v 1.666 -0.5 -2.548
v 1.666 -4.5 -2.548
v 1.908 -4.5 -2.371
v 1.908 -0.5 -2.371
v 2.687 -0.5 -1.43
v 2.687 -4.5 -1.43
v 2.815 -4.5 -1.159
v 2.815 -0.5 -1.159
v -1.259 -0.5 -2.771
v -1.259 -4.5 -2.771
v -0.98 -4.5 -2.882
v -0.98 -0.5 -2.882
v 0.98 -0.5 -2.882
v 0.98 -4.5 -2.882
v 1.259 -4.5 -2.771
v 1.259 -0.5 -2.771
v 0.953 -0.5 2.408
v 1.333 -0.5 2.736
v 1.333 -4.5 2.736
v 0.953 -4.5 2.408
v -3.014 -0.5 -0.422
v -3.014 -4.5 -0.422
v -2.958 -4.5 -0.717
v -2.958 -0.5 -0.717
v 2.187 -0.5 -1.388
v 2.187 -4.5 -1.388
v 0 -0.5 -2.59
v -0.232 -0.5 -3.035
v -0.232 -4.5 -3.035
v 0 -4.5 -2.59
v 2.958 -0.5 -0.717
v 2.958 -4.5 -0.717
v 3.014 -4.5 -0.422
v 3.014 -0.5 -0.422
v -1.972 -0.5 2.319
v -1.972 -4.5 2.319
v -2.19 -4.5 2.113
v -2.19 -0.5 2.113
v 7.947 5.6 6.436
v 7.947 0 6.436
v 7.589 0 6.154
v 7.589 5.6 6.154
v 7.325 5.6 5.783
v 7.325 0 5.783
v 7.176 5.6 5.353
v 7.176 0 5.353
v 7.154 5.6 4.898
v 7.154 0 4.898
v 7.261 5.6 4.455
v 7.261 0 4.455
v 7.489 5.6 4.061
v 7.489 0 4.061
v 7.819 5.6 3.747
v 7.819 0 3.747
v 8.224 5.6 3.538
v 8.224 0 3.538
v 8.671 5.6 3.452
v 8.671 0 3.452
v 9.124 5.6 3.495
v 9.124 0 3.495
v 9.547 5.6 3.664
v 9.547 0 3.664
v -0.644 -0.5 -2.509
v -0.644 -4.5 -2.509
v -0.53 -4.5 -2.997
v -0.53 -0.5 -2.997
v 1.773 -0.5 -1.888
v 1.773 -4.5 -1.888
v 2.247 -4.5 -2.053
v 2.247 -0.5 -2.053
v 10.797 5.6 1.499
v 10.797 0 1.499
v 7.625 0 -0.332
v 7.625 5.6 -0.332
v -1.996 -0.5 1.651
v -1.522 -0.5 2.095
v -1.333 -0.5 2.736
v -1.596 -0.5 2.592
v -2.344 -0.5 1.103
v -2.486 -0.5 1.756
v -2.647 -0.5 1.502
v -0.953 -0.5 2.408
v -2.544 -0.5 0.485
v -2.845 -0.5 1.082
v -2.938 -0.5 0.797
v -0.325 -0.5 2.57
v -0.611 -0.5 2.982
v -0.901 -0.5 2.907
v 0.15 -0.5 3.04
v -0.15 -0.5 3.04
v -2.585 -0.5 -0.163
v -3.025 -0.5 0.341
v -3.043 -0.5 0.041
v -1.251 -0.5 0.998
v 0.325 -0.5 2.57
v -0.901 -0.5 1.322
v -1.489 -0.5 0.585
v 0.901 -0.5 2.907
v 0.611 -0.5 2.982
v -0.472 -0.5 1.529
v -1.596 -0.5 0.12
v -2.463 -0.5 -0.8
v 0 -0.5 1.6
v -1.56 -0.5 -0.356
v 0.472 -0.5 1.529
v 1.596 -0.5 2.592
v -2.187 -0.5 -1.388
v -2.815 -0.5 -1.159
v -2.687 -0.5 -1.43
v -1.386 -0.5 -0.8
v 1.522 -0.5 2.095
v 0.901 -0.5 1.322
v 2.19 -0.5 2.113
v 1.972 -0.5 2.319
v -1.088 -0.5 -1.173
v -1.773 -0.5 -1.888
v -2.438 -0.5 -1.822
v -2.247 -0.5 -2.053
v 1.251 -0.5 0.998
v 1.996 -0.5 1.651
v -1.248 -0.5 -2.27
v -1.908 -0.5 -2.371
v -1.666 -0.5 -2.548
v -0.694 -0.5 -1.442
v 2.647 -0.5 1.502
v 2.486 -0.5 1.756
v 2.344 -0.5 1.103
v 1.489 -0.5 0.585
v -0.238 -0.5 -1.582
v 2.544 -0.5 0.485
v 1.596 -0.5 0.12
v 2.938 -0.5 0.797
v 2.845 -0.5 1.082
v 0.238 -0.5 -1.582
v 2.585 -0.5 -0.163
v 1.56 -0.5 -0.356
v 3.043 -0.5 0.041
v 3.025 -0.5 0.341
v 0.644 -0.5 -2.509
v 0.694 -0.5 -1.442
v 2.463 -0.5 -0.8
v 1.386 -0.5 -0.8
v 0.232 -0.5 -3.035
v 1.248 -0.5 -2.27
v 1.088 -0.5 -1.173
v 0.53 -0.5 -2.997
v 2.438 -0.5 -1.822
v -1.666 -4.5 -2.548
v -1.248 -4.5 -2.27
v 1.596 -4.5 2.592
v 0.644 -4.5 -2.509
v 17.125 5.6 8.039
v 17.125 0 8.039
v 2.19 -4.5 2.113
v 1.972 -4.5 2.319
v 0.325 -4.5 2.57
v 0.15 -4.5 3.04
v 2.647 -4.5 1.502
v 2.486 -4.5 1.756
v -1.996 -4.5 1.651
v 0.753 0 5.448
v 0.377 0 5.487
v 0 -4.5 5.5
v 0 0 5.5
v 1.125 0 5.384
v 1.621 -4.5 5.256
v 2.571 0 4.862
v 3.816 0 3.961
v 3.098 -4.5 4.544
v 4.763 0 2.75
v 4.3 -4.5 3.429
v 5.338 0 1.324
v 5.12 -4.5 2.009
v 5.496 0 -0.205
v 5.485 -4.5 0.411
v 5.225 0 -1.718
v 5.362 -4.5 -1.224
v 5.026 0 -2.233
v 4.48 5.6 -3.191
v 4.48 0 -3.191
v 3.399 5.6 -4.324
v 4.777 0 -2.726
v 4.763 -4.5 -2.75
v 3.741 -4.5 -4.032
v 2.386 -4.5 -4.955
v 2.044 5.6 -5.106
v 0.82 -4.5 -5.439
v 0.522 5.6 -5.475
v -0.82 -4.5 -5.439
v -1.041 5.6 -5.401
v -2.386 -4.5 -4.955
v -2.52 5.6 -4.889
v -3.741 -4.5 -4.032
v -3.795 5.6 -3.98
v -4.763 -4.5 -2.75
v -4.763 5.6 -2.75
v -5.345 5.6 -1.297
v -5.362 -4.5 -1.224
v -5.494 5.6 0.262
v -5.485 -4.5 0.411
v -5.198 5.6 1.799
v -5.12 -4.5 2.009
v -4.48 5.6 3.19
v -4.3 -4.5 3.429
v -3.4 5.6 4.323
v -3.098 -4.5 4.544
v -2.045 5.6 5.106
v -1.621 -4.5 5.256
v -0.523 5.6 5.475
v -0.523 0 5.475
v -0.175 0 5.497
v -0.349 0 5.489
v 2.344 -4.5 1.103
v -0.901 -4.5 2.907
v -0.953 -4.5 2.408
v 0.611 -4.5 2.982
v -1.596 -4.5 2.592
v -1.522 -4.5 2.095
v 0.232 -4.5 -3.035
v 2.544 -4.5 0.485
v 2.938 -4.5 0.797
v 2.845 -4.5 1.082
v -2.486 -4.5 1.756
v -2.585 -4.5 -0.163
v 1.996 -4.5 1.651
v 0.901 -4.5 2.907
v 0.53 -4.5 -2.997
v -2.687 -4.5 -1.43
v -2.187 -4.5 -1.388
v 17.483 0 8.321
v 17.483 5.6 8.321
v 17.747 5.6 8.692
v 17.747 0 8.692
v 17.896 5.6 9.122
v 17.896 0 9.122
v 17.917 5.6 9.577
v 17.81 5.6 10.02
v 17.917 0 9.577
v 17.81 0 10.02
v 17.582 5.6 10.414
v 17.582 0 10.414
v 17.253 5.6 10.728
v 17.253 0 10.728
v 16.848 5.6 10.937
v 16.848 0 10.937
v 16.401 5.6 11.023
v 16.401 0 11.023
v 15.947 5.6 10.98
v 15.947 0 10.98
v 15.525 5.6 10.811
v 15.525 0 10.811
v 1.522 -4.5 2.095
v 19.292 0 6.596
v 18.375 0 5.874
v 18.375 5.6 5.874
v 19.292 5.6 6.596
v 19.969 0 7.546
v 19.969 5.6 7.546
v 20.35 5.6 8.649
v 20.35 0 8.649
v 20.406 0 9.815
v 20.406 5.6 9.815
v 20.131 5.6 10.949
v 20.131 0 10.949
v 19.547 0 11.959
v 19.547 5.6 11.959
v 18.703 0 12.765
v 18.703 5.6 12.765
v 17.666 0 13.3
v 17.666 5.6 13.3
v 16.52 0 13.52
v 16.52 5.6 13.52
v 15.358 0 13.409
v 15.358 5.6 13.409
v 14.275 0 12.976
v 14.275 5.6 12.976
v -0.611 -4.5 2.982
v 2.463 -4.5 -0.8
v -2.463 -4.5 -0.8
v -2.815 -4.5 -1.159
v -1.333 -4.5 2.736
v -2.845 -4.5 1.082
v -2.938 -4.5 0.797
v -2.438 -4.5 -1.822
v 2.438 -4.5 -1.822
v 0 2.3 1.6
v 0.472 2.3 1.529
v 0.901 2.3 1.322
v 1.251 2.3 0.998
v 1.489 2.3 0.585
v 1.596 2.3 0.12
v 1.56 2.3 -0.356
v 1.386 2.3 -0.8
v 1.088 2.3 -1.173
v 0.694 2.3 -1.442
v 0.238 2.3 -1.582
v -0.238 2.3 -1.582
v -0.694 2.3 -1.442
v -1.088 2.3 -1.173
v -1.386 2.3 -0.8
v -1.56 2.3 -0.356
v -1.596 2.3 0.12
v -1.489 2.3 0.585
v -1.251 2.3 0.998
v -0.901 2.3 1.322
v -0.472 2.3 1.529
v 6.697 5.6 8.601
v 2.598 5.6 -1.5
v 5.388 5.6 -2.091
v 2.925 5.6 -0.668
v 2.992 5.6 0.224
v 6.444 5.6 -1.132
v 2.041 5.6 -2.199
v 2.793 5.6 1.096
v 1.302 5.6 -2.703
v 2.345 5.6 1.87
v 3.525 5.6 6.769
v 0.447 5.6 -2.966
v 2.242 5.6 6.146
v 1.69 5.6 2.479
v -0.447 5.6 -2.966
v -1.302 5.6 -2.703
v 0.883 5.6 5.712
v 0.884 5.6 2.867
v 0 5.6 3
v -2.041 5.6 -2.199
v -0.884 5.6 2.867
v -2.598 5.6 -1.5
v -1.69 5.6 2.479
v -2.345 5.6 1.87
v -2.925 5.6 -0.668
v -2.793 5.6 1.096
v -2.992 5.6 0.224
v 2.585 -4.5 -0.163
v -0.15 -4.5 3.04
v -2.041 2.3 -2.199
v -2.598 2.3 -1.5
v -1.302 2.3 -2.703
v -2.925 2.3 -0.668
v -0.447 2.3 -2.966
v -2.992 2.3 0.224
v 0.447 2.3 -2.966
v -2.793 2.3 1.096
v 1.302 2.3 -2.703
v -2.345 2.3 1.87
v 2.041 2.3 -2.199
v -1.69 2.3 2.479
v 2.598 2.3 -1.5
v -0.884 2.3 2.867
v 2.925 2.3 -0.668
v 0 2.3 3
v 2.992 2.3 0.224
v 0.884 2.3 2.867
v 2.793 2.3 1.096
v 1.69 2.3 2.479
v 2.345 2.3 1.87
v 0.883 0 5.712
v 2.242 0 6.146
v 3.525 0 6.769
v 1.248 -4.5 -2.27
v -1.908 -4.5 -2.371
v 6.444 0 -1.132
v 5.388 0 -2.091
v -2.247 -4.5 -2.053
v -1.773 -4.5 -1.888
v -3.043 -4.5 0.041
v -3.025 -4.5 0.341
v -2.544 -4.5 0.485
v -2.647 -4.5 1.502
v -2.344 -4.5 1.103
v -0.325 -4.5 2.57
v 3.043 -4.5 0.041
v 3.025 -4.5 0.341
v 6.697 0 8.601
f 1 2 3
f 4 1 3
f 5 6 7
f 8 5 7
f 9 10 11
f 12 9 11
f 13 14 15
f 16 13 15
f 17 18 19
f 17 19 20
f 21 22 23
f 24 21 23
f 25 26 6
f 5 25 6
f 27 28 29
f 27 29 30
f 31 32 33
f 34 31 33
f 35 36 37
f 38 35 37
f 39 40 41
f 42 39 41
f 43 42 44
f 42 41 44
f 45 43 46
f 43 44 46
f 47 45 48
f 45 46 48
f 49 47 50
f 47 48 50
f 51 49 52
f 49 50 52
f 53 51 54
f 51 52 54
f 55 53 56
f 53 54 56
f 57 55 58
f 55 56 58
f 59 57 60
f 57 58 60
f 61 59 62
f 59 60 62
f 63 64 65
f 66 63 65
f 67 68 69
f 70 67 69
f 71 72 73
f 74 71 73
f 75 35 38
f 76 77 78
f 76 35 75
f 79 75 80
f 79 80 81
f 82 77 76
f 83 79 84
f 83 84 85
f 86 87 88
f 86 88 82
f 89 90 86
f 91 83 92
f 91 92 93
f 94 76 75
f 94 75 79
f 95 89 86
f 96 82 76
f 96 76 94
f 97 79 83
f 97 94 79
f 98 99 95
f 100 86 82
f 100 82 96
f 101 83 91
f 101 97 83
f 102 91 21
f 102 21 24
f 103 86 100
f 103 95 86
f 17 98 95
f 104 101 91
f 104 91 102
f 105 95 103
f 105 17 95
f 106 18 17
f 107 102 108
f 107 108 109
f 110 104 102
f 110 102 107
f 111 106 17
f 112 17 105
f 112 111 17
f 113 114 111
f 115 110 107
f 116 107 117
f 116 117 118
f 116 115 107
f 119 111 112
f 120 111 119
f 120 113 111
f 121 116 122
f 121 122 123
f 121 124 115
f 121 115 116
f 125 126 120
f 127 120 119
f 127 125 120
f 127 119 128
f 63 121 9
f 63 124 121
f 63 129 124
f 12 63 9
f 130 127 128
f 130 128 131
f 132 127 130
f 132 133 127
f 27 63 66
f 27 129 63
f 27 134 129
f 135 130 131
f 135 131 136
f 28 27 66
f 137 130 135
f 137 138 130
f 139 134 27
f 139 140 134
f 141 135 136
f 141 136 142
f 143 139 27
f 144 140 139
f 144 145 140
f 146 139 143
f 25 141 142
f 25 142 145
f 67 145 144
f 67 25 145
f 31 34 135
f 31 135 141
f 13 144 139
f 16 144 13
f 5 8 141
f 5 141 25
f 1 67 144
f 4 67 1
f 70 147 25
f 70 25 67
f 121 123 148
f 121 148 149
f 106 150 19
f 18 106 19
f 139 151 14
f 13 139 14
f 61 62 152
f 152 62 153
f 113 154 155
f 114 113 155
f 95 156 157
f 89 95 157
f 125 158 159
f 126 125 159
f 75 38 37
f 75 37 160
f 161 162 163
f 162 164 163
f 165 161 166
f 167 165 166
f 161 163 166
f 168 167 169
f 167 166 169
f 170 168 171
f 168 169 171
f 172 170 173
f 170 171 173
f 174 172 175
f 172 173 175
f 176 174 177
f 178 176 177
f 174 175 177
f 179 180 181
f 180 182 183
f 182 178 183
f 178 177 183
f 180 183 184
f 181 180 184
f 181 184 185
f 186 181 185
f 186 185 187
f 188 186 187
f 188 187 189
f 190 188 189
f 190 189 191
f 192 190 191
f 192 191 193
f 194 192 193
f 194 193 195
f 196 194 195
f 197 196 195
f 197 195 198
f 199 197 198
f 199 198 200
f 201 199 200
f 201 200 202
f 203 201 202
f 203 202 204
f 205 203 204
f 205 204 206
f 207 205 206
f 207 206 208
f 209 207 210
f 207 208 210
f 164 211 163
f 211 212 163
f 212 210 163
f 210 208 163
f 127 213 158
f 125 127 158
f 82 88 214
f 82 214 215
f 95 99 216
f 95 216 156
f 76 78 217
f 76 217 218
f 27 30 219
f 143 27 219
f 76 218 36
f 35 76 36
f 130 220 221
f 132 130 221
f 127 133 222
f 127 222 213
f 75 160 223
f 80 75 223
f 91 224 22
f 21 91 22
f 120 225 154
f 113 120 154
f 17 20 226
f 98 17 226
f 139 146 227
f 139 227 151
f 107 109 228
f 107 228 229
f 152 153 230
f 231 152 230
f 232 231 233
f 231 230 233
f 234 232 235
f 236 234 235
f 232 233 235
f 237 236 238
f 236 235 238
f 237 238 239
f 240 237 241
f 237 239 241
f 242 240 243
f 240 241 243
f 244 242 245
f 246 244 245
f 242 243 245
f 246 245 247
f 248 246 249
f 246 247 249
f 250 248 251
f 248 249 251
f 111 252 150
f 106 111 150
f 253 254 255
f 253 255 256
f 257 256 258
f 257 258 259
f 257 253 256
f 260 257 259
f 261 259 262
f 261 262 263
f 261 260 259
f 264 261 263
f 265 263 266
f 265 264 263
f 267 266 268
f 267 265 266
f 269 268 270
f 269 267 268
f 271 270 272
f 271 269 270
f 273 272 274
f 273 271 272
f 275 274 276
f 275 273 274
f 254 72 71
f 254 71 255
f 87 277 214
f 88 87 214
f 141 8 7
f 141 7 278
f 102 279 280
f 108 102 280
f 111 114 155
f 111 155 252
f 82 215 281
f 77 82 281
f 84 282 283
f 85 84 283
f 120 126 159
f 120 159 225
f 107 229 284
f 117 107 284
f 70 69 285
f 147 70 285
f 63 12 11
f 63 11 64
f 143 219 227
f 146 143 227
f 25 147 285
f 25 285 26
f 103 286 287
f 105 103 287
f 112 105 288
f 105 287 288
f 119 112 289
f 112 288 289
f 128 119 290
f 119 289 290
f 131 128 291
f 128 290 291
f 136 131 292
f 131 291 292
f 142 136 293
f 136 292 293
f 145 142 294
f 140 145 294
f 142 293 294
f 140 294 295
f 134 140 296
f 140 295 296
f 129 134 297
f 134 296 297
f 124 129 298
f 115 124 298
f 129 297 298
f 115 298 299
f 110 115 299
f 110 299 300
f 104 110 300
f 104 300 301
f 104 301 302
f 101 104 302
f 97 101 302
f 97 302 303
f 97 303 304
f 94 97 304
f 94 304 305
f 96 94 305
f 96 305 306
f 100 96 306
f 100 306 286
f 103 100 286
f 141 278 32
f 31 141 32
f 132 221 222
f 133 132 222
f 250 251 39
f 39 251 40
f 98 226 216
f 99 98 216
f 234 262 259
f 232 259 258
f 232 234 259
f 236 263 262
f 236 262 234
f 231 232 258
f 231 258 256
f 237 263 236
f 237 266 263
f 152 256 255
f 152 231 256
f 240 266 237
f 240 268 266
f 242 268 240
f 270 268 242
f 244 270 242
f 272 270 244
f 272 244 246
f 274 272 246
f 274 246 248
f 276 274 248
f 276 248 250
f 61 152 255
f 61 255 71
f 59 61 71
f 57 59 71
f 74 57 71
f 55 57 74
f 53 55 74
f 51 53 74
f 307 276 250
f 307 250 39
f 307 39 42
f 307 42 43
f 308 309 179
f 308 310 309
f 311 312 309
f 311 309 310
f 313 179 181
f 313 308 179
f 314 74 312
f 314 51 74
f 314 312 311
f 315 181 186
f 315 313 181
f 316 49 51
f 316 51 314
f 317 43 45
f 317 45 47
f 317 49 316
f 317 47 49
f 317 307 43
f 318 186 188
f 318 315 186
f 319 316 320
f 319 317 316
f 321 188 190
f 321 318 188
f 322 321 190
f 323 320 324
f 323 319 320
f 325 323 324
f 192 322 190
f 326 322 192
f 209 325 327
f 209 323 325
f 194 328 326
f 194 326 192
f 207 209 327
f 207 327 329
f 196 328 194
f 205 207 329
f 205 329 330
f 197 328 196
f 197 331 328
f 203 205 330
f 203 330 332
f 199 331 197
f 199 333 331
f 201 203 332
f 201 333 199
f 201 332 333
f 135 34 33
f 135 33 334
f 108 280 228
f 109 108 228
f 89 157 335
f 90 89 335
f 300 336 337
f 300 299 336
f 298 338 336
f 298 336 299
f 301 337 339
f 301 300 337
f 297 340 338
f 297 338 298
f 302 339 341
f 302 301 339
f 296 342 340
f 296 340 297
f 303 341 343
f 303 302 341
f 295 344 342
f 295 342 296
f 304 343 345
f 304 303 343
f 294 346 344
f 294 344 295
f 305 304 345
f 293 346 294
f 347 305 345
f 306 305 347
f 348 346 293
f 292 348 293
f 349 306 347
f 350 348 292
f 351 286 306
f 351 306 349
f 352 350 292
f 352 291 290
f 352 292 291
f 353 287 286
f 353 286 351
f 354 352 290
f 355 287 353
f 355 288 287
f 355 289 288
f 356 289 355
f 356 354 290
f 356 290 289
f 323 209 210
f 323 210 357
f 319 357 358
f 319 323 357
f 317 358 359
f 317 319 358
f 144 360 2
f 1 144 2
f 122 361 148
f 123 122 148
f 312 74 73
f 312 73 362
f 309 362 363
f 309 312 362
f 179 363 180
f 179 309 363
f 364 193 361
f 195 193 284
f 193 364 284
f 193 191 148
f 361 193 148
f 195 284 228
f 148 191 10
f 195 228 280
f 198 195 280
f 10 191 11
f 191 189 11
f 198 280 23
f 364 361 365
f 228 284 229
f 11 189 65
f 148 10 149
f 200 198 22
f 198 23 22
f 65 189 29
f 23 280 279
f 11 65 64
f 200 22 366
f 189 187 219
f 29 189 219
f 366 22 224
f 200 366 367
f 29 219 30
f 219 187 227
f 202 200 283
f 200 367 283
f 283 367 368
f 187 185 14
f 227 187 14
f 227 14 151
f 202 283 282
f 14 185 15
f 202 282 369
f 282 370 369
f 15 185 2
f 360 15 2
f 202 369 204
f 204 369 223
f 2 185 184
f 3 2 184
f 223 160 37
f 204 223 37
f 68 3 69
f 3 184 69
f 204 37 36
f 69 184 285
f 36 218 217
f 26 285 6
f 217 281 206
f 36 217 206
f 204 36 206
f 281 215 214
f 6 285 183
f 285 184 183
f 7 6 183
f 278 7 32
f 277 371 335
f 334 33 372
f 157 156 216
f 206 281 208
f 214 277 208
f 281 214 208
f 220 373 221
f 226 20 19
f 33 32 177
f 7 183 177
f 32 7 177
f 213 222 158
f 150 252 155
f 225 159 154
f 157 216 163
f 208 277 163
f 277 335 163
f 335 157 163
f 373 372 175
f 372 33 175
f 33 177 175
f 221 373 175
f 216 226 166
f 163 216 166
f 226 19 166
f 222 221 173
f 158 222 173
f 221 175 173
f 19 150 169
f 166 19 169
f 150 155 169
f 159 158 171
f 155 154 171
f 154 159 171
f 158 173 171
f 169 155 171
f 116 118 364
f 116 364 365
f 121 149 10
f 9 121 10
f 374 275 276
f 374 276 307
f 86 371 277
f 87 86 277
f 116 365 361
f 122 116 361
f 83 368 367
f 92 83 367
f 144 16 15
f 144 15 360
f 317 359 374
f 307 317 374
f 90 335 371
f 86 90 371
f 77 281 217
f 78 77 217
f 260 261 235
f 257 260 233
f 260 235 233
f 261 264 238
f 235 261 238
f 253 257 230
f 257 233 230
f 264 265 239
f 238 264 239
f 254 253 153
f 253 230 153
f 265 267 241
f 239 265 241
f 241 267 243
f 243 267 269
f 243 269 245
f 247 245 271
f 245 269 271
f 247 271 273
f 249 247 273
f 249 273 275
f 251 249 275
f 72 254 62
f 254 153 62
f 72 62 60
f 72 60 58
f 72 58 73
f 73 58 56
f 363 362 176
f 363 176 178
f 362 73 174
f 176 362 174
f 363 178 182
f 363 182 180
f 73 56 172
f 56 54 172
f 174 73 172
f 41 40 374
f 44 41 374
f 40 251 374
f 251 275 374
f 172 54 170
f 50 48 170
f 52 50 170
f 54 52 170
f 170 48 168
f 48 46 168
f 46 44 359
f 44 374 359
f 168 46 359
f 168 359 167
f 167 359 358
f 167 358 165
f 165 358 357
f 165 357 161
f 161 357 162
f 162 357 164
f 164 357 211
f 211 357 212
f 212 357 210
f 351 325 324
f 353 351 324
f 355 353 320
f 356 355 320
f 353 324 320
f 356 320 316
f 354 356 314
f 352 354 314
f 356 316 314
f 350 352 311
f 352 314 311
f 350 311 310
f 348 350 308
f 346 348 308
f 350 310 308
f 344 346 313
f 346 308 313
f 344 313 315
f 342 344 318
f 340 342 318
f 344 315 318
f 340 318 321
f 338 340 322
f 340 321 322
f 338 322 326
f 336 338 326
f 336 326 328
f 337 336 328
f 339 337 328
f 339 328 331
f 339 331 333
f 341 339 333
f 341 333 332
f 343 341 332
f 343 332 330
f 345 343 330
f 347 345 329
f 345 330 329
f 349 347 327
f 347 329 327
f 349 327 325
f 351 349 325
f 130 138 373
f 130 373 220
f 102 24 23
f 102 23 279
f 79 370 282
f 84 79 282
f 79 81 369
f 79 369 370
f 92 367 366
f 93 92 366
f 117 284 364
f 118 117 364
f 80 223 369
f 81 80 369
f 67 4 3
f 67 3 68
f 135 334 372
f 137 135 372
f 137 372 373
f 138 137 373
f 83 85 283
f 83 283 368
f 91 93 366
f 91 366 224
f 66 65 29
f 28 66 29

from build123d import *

# Parameters (mm, degrees)
EXTRUDE_THIN2_DEPTH = 5.6
BOSS_EXTRUDE1_DEPTH = 5.6
BOSS_EXTRUDE2_START = -4.5
SKETCH6_R           = 5.5
BOSS_EXTRUDE2_DEPTH = 10.1
FILLET1_R           = 10
SKETCH7_R           = 2.59
CUT_EXTRUDE3_DEPTH  = 4
CUT_EXTRUDE4_DEPTH  = 4
CIRPATTERN1_COUNT   = 25
SKETCH9_R           = 3
CUT_EXTRUDE5_DEPTH  = 3.3
SKETCH10_R          = 1.6
CUT_EXTRUDE6_DEPTH  = 26.423002314


with BuildPart() as part:
    # Sketch4 → Extrude-Thin2 (new body)
    with BuildSketch(Plane(origin=(0, 0, 0), x_dir=(1, 0, 0), z_dir=(0, 1, 0))):
        with BuildLine():
            Line((10.796856578, -1.499295844), (18.374578861, -5.874295844))
            ThreePointArc((18.374578861, -5.874295844), (19.875283017, -11.475), (14.274578861, -12.975704156))
            Line((14.274578861, -12.975704156), (6.696856578, -8.600704156))
            ThreePointArc((6.696856578, -8.600704156), (5.196152423, -3), (10.796856578, -1.499295844))
        make_face()
        with BuildLine():
            Line((9.546856578, -3.664359354), (17.124578861, -8.039359354))
            ThreePointArc((17.124578861, -8.039359354), (17.710219507, -10.225), (15.524578861, -10.810640646))
            Line((15.524578861, -10.810640646), (7.946856578, -6.435640646))
            ThreePointArc((7.946856578, -6.435640646), (7.361215932, -4.25), (9.546856578, -3.664359354))
        make_face(mode=Mode.SUBTRACT)
    extrude(amount=EXTRUDE_THIN2_DEPTH)

    # Sketch5 → Boss-Extrude1 (add)
    with BuildSketch(Plane(origin=(0, 0, 0), x_dir=(1, 0, 0), z_dir=(0, 1, 0))):
        with BuildLine():
            Line((10.796856578, -1.499295844), (2.05, 3.550704156))
            ThreePointArc((2.05, 3.550704156), (-3.550704156, 2.05), (-2.05, -3.550704156))
            Line((-2.05, -3.550704156), (6.696856578, -8.600704156))
            ThreePointArc((6.696856578, -8.600704156), (8.998238507, -9.142286296), (11.216030786, -8.323099255))
            Line((11.216030786, -8.323099255), (7.946856578, -6.435640646))
            ThreePointArc((7.946856578, -6.435640646), (7.361215932, -4.25), (9.546856578, -3.664359354))
            Line((9.546856578, -3.664359354), (12.816030786, -5.551817963))
            ThreePointArc((12.816030786, -5.551817963), (12.416571434, -3.221559989), (10.796856578, -1.499295844))
        make_face()
    extrude(amount=BOSS_EXTRUDE1_DEPTH)

    # Sketch6 → Boss-Extrude2 (add)
    with BuildSketch(Plane(origin=(0, 0, 0), x_dir=(1, 0, 0), z_dir=(0, 1, 0)).offset(BOSS_EXTRUDE2_START)):
        with Locations(Location((0, 0, 0), (0, 0, 270))):
            Circle(SKETCH6_R)
    extrude(amount=BOSS_EXTRUDE2_DEPTH)

    # Fillet1
    # the kernel refuses this fillet: 10 mm, written as the material it adds along each edge
    with BuildSketch(Plane(origin=(1.124901573, 5.6, 5.383734433), x_dir=(-0.998469356889102, 0, 0.05530771513507689), z_dir=(0, -1, 0))) as fillet1_piece_1:
        with BuildLine():
            CenterArc((3.151594855, -9.886744715), FILLET1_R, 98.631327733, 24.539188727)
            Line((-2.319730793, -1.516285011), (0, 0))
            ThreePointArc((0, 0), (0.8254177, -0.062290407), (1.6508354, 0))
        make_face()
    extrude(amount=5.6)
    with BuildSketch(Plane(origin=(5.224901573, 5.6, -1.717673878), x_dir=(0.8660254037844397, 0, 0.49999999999999806), z_dir=(0, -1, 0))) as fillet1_piece_2:
        with BuildLine():
            CenterArc((2.77133022, -10), FILLET1_R, 90, 24.539188727)
            ThreePointArc((-1.381825119, -0.903225806), (-0.65683145, -0.503752837), (0, 0))
            Line((0, 0), (2.77133022, 0))
        make_face()
    extrude(amount=5.6)

    # Sketch7 → Cut-Extrude3 (cut)
    with BuildSketch(Plane.XZ.offset(4.5)):
        with Locations(Location((0, 0, 0), (0, 0, 270))):
            Circle(SKETCH7_R)
    extrude(amount=-CUT_EXTRUDE3_DEPTH, mode=Mode.SUBTRACT)

    # Sketch8 → Cut-Extrude4 (cut)
    with BuildSketch(Plane.XZ.offset(4.5)):
        with BuildLine():
            Line((0, 3.04), (0, 2.59))
            ThreePointArc((0, 2.59), (0.162627446, 2.584889227), (0.324613075, 2.569577076))
            Line((0.324613075, 2.569577076), (0.15, 3.04))
            Line((0.15, 3.04), (0, 3.04))
        make_face()
        with BuildLine():
            ThreePointArc((-0.324613075, 2.569577076), (-0.162627446, 2.584889227), (0, 2.59))
            Line((0, 2.59), (0, 3.04))
            Line((0, 3.04), (-0.15, 3.04))
            Line((-0.15, 3.04), (-0.324613075, 2.569577076))
        make_face()
    cut_extrude4 = extrude(amount=-CUT_EXTRUDE4_DEPTH, mode=Mode.SUBTRACT)

    # CirPattern1: Cut-Extrude4 ×25 about axis
    cirpattern1_axis = Axis((0, 0, 0), (0, 1, 0))
    for i in range(1, CIRPATTERN1_COUNT):
        add(cut_extrude4.rotate(cirpattern1_axis, i * 360 / CIRPATTERN1_COUNT), mode=Mode.SUBTRACT)

    # Sketch9 → Cut-Extrude5 (cut)
    with BuildSketch(Plane(origin=(0, 5.6, 0), x_dir=(1, 0, 0), z_dir=(0, 1, 0))):
        with Locations(Location((0, 0, 0), (0, 0, 270))):
            Circle(SKETCH9_R)
    extrude(amount=-CUT_EXTRUDE5_DEPTH, mode=Mode.SUBTRACT)

    # Sketch10 → Cut-Extrude6 (cut, through all)
    with BuildSketch(Plane(origin=(0, 2.3, 0), x_dir=(1, 0, 0), z_dir=(0, 1, 0))):
        with Locations(Location((0, 0, 0), (0, 0, 270))):
            Circle(SKETCH10_R)
    extrude(amount=-CUT_EXTRUDE6_DEPTH, mode=Mode.SUBTRACT)


solid = part.part
